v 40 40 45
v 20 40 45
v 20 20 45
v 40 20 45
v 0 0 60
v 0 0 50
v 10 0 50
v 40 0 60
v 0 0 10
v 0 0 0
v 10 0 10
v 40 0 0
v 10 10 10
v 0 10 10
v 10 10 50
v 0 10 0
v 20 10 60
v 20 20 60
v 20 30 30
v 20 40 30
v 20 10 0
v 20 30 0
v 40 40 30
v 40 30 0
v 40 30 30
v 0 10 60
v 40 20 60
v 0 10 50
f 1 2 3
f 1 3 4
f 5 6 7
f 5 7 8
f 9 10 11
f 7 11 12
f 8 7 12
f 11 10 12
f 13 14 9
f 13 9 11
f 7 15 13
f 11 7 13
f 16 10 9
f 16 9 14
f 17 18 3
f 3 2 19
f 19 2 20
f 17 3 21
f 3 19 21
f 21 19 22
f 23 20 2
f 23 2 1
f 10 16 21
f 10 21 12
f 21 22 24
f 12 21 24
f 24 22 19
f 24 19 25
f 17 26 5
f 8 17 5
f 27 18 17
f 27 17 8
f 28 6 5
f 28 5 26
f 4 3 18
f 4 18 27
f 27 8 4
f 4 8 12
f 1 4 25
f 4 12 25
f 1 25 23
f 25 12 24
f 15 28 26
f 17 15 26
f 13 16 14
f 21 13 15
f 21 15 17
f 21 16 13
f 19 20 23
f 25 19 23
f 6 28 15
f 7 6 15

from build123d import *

# Parameters (mm, degrees)
SKETCH1_W           = 40
SKETCH1_H           = 40
BOSS_EXTRUDE1_DEPTH = 60
SKETCH3_W           = 10
SKETCH3_H           = 40
CUT_EXTRUDE1_DEPTH  = 60
CUT_EXTRUDE2_DEPTH  = 30
SKETCH5_W           = 10
SKETCH5_H           = 60
CUT_EXTRUDE3_DEPTH  = 30
SKETCH6_W           = 20
SKETCH6_H           = 30
CUT_EXTRUDE4_DEPTH  = 10
SKETCH7_W           = 20
SKETCH7_H           = 15
CUT_EXTRUDE5_DEPTH  = 20


with BuildPart() as part:
    # Sketch1 → Boss-Extrude1 (new body)
    with BuildSketch(Plane.XY):
        with Locations((20, 20)):
            Rectangle(SKETCH1_W, SKETCH1_H)
    extrude(amount=BOSS_EXTRUDE1_DEPTH)

    # Sketch3 → Cut-Extrude1 (cut)
    with BuildSketch(Plane(origin=(0, 40, 0), x_dir=(1, 0, 0), z_dir=(0, 1, 0))):
        with Locations((5, -30)):
            Rectangle(SKETCH3_W, SKETCH3_H)
    extrude(amount=-CUT_EXTRUDE1_DEPTH, mode=Mode.SUBTRACT)

    # Sketch4 → Cut-Extrude2 (cut)
    with BuildSketch(Plane(origin=(0, 40, 0), x_dir=(1, 0, 0), z_dir=(0, 1, 0))):
        Polygon((10, -10), (10, -60), (20, -60), (20, -10), (20, 0), (10, 0), align=None)
    extrude(amount=-CUT_EXTRUDE2_DEPTH, mode=Mode.SUBTRACT)

    # Sketch5 → Cut-Extrude3 (cut)
    with BuildSketch(Plane(origin=(0, 40, 0), x_dir=(1, 0, 0), z_dir=(0, 1, 0))):
        with Locations((5, -30)):
            Rectangle(SKETCH5_W, SKETCH5_H)
    extrude(amount=-CUT_EXTRUDE3_DEPTH, mode=Mode.SUBTRACT)

    # Sketch6 → Cut-Extrude4 (cut)
    with BuildSketch(Plane(origin=(0, 40, 0), x_dir=(1, 0, 0), z_dir=(0, 1, 0))):
        with Locations((30, -15)):
            Rectangle(SKETCH6_W, SKETCH6_H)
    extrude(amount=-CUT_EXTRUDE4_DEPTH, mode=Mode.SUBTRACT)

    # Sketch7 → Cut-Extrude5 (cut)
    with BuildSketch(Plane(origin=(0, 40, 0), x_dir=(1, 0, 0), z_dir=(0, 1, 0))):
        with Locations((30, -52.5)):
            Rectangle(SKETCH7_W, SKETCH7_H)
    extrude(amount=-CUT_EXTRUDE5_DEPTH, mode=Mode.SUBTRACT)


solid = part.part
